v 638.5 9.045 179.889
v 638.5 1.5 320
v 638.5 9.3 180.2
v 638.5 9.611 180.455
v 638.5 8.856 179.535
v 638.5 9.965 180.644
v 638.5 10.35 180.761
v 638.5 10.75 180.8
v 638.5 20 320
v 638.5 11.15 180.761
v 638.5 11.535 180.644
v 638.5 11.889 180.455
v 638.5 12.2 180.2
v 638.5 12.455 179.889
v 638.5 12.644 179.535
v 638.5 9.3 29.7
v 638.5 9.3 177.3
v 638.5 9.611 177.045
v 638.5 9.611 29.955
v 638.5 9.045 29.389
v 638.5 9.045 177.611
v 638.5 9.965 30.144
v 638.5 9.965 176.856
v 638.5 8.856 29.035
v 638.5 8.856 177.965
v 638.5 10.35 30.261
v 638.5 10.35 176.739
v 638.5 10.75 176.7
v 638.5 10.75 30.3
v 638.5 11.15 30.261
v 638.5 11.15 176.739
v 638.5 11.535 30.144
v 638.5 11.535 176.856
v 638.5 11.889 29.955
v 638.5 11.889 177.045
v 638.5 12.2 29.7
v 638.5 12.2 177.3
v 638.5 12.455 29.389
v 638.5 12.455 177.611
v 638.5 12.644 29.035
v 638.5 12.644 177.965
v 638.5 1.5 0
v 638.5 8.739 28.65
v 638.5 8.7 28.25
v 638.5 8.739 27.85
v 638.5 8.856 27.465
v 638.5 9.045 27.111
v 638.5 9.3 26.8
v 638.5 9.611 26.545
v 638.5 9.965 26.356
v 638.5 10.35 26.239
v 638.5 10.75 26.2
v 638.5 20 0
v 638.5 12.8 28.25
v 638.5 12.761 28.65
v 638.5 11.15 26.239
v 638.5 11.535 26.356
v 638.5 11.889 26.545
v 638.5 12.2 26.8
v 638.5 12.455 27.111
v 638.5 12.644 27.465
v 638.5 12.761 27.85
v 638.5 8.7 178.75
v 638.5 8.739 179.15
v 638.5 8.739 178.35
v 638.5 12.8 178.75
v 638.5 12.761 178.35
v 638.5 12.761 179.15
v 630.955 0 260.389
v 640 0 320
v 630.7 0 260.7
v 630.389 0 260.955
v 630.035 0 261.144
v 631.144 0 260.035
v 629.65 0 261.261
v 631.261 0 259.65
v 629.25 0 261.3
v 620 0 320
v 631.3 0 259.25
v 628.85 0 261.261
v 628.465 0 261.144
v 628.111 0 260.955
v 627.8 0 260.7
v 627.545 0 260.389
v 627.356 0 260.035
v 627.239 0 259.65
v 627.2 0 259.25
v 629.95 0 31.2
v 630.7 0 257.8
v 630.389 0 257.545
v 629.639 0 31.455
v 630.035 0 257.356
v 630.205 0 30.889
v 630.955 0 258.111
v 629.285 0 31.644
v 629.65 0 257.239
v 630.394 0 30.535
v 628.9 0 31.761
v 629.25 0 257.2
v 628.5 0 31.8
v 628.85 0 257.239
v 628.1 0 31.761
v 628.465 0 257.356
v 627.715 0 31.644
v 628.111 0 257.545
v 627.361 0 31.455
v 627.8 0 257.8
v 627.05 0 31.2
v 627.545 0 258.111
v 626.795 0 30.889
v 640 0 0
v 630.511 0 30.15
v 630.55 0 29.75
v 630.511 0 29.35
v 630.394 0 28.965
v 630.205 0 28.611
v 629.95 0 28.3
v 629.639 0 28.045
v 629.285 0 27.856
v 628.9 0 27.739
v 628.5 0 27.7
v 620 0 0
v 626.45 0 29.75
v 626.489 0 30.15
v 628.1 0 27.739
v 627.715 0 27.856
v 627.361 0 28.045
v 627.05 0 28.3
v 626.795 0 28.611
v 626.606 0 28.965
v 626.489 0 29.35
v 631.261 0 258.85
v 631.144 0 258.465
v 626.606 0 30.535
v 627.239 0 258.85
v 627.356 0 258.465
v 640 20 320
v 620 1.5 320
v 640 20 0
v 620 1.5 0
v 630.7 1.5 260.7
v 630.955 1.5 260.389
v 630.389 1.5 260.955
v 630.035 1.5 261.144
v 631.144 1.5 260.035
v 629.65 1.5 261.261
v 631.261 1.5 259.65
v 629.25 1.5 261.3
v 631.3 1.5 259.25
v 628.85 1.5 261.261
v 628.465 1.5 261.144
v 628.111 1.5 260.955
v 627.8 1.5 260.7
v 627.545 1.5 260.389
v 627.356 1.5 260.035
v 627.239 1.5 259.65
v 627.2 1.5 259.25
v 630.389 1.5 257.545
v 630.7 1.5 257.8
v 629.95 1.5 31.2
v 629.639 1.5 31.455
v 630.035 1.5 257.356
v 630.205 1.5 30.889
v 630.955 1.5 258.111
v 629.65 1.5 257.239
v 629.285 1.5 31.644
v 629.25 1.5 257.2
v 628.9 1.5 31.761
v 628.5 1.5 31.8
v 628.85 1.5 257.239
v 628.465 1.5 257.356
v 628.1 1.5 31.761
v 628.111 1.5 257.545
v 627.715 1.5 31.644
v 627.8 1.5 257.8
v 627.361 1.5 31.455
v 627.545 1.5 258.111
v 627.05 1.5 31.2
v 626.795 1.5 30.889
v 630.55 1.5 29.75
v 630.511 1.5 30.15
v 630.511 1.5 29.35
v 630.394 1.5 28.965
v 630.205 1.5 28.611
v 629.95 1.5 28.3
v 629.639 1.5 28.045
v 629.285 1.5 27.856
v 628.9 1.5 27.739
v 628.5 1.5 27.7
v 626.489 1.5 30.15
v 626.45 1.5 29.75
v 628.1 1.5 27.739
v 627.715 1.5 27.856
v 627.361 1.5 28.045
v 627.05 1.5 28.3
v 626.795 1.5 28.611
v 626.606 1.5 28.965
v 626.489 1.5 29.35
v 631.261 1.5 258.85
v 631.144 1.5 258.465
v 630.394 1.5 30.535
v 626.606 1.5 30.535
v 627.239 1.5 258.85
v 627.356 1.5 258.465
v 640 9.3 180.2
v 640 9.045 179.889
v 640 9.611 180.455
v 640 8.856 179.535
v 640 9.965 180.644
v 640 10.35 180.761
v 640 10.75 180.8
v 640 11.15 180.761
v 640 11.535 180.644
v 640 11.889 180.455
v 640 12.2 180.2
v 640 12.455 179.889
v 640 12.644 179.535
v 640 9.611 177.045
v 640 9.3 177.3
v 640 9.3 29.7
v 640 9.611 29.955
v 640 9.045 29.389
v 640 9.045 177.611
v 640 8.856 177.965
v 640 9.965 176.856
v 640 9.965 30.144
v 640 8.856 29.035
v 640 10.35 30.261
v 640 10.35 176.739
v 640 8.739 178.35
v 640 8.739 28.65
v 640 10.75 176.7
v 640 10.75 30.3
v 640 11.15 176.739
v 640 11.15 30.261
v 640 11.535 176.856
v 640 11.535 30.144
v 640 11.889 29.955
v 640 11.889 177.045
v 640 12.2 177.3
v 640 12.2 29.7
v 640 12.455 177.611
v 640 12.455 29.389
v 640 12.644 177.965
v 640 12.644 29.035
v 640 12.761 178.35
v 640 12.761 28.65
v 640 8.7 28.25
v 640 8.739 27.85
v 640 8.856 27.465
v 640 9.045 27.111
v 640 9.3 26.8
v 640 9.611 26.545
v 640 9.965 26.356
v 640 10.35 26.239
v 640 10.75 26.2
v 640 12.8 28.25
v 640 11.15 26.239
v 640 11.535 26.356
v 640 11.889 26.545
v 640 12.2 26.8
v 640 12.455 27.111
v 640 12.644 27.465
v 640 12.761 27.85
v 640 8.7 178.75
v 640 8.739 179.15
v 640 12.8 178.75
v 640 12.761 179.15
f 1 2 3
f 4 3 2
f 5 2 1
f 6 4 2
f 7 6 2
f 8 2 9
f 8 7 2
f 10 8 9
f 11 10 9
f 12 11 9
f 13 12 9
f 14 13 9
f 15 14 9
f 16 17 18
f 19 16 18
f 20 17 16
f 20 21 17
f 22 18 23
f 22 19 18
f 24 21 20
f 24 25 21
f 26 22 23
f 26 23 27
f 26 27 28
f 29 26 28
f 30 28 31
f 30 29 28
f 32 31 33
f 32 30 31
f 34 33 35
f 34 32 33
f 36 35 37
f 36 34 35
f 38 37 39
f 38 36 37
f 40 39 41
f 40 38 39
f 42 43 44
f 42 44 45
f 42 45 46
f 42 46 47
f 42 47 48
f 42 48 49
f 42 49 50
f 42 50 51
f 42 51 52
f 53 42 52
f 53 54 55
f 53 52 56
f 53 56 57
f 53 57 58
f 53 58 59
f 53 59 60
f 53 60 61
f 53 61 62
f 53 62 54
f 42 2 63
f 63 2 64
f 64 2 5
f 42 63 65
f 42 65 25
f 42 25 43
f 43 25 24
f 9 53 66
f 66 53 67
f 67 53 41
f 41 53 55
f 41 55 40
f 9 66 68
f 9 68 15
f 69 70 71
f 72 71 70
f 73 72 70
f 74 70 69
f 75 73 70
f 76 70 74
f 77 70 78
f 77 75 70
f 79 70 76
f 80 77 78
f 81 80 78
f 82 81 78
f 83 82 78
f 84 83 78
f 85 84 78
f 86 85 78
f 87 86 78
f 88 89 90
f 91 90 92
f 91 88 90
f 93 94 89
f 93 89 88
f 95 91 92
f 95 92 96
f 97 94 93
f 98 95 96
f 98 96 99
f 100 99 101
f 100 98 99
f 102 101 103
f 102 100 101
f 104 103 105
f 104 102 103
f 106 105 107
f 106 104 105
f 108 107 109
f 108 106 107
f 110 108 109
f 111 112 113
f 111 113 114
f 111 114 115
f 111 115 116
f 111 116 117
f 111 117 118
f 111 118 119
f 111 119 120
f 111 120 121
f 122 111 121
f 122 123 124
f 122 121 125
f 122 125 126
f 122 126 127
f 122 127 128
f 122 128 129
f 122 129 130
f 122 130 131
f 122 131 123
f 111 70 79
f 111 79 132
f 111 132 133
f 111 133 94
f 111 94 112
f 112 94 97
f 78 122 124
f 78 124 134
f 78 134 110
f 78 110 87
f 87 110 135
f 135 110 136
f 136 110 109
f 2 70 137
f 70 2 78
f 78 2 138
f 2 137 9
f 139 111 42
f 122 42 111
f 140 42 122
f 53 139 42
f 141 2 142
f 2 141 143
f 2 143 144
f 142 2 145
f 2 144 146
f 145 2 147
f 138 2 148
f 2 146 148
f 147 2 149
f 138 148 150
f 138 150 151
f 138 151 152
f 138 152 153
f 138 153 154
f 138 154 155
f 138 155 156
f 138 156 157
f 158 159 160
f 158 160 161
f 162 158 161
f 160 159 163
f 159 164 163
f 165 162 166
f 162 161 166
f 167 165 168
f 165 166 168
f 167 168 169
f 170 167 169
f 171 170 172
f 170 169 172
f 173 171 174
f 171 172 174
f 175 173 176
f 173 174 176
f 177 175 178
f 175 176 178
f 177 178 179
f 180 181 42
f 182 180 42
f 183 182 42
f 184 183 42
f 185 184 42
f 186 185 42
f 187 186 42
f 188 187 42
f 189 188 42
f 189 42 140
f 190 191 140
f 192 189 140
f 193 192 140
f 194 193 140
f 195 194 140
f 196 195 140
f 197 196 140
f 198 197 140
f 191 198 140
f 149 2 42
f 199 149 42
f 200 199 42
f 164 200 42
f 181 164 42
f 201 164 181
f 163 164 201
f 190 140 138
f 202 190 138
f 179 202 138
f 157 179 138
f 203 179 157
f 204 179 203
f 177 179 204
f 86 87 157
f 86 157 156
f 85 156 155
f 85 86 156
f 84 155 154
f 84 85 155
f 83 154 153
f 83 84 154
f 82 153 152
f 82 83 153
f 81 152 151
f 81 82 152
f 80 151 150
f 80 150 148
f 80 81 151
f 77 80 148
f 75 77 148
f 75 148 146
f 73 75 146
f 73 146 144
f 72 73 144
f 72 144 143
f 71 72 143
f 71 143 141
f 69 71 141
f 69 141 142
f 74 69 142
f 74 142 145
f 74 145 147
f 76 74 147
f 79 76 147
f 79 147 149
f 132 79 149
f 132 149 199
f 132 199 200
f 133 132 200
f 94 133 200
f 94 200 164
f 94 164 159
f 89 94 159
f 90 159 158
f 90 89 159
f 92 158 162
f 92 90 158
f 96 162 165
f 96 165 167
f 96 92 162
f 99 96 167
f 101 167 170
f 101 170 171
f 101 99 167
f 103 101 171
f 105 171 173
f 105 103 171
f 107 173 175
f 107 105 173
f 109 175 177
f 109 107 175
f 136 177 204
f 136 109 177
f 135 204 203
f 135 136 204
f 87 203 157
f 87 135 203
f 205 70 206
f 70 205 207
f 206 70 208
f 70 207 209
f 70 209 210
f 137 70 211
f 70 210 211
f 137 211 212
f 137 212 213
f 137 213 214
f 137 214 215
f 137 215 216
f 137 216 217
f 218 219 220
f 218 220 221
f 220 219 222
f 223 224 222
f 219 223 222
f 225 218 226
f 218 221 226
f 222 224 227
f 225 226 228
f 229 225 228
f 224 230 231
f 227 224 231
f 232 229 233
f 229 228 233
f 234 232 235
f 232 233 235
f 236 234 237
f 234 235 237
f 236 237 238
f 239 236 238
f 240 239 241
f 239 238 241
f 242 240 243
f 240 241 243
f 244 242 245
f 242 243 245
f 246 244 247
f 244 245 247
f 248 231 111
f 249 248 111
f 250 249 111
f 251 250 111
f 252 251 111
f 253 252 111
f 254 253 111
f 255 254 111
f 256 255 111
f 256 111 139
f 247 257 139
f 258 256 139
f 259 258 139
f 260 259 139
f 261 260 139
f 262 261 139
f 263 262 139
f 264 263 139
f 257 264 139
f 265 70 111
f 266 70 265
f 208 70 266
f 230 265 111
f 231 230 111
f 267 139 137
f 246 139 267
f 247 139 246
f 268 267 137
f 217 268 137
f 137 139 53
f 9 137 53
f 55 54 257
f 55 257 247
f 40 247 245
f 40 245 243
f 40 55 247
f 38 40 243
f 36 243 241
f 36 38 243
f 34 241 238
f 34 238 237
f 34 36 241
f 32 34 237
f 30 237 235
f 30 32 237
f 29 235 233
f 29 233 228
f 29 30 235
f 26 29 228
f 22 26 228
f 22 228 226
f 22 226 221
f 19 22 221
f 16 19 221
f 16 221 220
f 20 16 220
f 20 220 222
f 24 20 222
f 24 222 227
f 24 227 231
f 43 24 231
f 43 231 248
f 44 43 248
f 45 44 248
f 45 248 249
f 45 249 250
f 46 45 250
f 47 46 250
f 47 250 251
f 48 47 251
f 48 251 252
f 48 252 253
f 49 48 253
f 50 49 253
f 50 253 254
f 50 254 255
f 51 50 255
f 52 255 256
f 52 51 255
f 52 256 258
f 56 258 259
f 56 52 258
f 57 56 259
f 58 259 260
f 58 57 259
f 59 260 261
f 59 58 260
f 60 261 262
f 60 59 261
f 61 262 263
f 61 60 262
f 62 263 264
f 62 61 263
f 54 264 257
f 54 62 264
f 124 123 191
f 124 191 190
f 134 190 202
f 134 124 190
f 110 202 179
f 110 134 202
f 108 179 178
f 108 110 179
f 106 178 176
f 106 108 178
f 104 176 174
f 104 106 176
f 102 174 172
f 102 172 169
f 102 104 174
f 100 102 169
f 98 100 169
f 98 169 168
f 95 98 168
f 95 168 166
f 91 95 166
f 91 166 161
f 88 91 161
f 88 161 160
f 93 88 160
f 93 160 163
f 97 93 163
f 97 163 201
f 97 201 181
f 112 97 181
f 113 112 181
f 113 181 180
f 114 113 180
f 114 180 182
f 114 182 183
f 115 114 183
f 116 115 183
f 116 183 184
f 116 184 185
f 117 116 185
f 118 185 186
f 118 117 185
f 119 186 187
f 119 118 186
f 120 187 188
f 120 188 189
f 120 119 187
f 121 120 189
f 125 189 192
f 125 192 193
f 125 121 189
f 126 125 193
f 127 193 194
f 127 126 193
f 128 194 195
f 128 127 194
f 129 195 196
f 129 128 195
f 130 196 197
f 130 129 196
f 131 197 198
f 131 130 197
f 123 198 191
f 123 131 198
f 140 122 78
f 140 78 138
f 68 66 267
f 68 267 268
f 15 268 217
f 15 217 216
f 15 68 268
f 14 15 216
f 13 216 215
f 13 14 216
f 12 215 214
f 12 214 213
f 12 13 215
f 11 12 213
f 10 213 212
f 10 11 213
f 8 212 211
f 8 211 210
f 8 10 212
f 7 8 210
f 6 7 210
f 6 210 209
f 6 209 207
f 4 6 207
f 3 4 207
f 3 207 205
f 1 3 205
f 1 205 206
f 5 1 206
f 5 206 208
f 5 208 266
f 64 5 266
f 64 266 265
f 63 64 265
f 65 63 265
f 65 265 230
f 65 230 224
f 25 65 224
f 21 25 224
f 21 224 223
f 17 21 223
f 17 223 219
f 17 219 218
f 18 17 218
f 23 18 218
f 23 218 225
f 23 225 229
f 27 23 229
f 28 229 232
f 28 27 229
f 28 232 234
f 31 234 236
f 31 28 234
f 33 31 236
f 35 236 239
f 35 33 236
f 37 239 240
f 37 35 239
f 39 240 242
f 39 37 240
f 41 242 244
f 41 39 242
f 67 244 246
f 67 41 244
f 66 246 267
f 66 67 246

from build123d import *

# Parameters (mm, degrees)
BOX001_W      = 20
BOX001_H      = 20
BOX001_DEPTH  = 320
BOX_W         = 20
BOX_H         = 20
BOX_DEPTH     = 320
SKETCH005_R   = 2.05
HOLE_DEPTH    = 1.501
SKETCH011_R   = 2.05
HOLE006_DEPTH = 1.501
SKETCH013_R   = 2.05
HOLE008_DEPTH = 21.501


with BuildPart() as cut015:
    # Box001 → Box001 (new body)
    with BuildSketch(Plane(origin=(1.5, 1.5, 0), x_dir=(1, 0, 0), z_dir=(0, 0, 1))):
        with Locations((10, 10)):
            Rectangle(BOX001_W, BOX001_H)
    extrude(amount=BOX001_DEPTH)


with BuildPart() as vertical_front_left_body:
    # Box → Box (new body)
    with BuildSketch(Plane.XY):
        with Locations((10, 10)):
            Rectangle(BOX_W, BOX_H)
    extrude(amount=BOX_DEPTH)

    # Cut001: cut Cut015
    add(cut015.part, mode=Mode.SUBTRACT)

    # Sketch005 → Hole (cut, through all)
    with BuildSketch(Plane.YZ.offset(1.5)):
        with Locations((10.75, 28.25)):
            Circle(SKETCH005_R)
    extrude(amount=-HOLE_DEPTH, mode=Mode.SUBTRACT)

    # Sketch011 → Hole006 (cut, through all)
    with BuildSketch(Plane.YZ.offset(1.5)):
        with Locations((10.75, 178.75)):
            Circle(SKETCH011_R)
    extrude(amount=-HOLE006_DEPTH, mode=Mode.SUBTRACT)

    # Sketch013 → Hole008 (cut, through all)
    with BuildSketch(Plane.XZ.offset(1.5)):
        with Locations((10.75, 259.25)):
            Circle(SKETCH013_R)
        with Locations((11.5, 29.75)):
            Circle(SKETCH013_R)
    extrude(amount=-HOLE008_DEPTH, mode=Mode.SUBTRACT)


with BuildPart() as vertical_front_left_mirror:
    # Part__Mirroring002: instance of vertical_front_left_body
    add(vertical_front_left_body.part.mirror(Plane(origin=(0, 0, 0), x_dir=(0, -1, 0), z_dir=(1, 0, 0))))


with BuildPart() as vertical_front_left_mirror_1:
    # Part__Mirroring002 placement: moved
    add(vertical_front_left_mirror.part.moved(Location((640, 0, 0))))


solid = vertical_front_left_mirror_1.part
